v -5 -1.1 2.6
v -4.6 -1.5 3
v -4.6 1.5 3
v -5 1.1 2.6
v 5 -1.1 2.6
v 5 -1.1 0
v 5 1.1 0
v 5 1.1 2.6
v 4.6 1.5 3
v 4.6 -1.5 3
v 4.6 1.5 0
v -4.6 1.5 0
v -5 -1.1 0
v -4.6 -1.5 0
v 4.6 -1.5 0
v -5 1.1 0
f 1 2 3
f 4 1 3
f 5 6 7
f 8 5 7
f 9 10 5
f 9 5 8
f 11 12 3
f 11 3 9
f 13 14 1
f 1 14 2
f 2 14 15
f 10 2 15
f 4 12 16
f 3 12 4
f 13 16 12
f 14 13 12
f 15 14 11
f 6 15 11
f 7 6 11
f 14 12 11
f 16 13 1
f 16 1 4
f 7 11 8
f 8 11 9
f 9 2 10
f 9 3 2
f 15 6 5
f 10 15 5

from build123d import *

# Parameters (mm, degrees)
F0_W     = 10
F0_H     = 3
F1_DEPTH = 3
F3_SIZE  = 0.4


# Not quite as in the source:
# - a feature of the source that left no trace in its solid (it failed there, or was rolled back) is left out


with BuildPart() as f1:
    # F0 (on Top) → F1 (new body)
    with BuildSketch(Plane.XY):
        Rectangle(F0_W, F0_H)
    extrude(amount=F1_DEPTH)

    # F3
    f3_edges = [f1.edges().sort_by_distance(p)[0] for p in [
        (5, -1.5, 1.5),
        (5, 1.5, 1.5),
        (-5, -1.5, 1.5),
        (-5, 1.5, 1.5),
        (5, 0, 3),
        (-5, 0, 3),
    ]]
    chamfer(f3_edges, length=F3_SIZE)


solid = f1.part
